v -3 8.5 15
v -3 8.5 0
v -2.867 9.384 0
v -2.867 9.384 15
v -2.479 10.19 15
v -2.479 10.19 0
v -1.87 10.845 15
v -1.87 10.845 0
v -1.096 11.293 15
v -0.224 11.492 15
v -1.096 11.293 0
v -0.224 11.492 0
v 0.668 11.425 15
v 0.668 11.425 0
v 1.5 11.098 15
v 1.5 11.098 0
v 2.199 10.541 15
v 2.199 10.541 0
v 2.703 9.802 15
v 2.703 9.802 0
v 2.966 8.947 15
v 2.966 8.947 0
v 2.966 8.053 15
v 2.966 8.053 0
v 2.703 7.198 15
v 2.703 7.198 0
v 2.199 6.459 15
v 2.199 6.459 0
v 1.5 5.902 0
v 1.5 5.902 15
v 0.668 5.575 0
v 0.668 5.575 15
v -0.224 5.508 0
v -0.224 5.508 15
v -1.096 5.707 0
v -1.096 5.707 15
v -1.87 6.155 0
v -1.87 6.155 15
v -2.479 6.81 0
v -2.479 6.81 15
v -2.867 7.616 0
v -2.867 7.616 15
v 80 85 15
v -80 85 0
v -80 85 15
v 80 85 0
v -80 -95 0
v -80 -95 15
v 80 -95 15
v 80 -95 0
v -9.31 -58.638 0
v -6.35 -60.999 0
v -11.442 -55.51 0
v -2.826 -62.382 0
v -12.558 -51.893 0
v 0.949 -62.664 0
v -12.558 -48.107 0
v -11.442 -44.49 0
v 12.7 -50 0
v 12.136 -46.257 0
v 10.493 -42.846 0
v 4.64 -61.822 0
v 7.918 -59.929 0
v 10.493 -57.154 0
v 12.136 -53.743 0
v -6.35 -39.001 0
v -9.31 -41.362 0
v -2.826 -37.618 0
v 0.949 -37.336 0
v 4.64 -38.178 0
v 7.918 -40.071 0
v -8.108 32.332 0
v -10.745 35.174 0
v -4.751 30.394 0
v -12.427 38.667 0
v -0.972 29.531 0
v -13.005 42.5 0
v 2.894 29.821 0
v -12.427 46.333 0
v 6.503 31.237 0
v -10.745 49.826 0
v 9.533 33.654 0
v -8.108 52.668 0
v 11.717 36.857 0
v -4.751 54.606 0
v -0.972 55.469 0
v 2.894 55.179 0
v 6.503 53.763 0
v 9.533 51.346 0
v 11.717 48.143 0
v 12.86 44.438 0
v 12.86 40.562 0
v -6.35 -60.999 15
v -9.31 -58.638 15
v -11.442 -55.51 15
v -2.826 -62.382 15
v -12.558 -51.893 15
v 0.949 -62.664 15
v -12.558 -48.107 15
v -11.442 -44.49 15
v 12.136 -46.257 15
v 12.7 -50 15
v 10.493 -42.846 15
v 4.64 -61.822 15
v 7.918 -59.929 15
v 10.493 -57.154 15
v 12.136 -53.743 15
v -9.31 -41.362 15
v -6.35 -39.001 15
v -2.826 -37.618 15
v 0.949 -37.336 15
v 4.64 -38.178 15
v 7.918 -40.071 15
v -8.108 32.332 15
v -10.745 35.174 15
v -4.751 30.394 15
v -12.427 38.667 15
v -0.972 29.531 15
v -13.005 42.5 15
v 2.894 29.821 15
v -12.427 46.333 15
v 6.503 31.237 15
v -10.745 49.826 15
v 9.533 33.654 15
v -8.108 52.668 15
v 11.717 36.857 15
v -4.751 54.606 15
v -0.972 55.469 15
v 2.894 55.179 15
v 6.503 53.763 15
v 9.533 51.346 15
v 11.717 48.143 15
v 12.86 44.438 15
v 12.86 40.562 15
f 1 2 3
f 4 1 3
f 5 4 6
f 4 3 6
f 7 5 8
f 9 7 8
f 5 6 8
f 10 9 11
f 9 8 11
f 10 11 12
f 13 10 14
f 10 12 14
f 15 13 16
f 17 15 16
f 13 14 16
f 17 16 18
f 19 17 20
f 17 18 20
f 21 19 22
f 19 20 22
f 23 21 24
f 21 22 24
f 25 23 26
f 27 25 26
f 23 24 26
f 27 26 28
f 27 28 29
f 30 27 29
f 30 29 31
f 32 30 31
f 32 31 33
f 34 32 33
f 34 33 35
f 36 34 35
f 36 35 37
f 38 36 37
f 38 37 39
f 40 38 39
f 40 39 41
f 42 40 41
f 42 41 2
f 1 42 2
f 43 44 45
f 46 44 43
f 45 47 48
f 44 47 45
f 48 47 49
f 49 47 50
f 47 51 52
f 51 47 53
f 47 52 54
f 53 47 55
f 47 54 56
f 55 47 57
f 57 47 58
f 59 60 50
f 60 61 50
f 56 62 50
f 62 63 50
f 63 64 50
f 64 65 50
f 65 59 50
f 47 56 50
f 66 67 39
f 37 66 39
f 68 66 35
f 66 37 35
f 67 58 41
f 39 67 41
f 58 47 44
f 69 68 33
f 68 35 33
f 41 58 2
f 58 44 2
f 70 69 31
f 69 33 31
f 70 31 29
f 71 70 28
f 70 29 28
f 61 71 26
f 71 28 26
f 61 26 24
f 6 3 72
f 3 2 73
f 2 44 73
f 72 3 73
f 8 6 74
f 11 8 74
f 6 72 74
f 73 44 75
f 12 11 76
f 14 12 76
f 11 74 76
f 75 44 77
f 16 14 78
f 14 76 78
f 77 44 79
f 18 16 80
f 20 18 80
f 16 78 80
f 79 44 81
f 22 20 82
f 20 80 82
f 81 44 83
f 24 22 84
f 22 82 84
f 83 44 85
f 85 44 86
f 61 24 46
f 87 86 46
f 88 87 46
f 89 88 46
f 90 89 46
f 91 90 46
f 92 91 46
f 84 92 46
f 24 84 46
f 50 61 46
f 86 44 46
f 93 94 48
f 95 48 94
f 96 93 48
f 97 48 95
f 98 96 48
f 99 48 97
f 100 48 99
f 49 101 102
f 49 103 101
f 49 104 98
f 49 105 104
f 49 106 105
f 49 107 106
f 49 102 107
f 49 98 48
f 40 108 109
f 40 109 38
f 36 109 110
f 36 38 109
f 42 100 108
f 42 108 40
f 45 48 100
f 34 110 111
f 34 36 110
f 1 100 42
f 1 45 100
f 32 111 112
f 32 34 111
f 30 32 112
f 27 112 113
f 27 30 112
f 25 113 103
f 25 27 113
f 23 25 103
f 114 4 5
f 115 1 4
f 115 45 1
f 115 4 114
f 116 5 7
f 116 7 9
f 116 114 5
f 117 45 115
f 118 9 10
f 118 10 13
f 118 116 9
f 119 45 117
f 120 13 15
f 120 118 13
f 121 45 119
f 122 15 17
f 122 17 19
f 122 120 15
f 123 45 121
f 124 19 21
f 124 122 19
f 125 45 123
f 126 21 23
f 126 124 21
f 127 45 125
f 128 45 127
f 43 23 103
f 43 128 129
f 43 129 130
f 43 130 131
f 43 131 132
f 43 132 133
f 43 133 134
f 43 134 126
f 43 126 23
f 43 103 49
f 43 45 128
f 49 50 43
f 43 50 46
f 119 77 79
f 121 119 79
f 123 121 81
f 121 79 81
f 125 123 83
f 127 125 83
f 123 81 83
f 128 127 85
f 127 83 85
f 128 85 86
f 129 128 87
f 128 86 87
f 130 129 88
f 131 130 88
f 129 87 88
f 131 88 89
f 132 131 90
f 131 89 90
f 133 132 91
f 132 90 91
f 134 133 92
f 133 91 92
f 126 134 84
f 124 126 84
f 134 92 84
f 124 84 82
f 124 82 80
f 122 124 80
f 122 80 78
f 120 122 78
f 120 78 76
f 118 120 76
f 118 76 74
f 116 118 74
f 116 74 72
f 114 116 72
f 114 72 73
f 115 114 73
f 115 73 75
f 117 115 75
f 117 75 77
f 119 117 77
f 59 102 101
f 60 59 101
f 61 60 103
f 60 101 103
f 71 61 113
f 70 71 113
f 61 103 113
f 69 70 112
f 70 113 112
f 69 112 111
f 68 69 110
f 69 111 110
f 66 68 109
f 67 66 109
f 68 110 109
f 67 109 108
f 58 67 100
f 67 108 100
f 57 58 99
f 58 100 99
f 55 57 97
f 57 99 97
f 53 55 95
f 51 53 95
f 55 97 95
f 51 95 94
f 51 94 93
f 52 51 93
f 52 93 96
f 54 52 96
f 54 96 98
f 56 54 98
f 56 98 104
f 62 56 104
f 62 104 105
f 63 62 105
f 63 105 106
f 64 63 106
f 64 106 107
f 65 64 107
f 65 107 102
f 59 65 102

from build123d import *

# Parameters (mm, degrees)
SKETCH2_W                  = 160
SKETCH2_H                  = 180
BOSS_EXTRUDE1_DEPTH        = 15
F_20_0_20_DIAMETER_HOLE1_D = 26.01
F_6_0MM_DOWEL_HOLE1_D      = 6
F_6_0MM_DOWEL_HOLE1_DEPTH  = 40
F_6_0MM_DOWEL_HOLE1_TIP    = 1.802581857
SKETCH10_R                 = 12.7
CUT_EXTRUDE1_DEPTH         = 16


with BuildPart() as part:
    # Sketch2 → Boss-Extrude1 (new body)
    with BuildSketch(Plane.XY):
        with Locations((0, -5)):
            Rectangle(SKETCH2_W, SKETCH2_H)
    extrude(amount=BOSS_EXTRUDE1_DEPTH)

    # Ø20.0 (20) Diameter Hole1 (through all)
    with Locations(Plane.XY.offset(15)):
        with Locations((0, 42.5)):
            Hole(F_20_0_20_DIAMETER_HOLE1_D / 2)

    # Ø6.0mm Dowel Hole1
    with Locations(Plane.XY.offset(15)):
        with Locations((0, 8.5)):
            Hole(F_6_0MM_DOWEL_HOLE1_D / 2, depth=F_6_0MM_DOWEL_HOLE1_DEPTH)
            with Locations((0, 0, -(F_6_0MM_DOWEL_HOLE1_DEPTH + F_6_0MM_DOWEL_HOLE1_TIP / 2))):  # 118° drill point
                Cone(0, F_6_0MM_DOWEL_HOLE1_D / 2, F_6_0MM_DOWEL_HOLE1_TIP, mode=Mode.SUBTRACT)

    # Sketch10 → Cut-Extrude1 (cut, through all)
    with BuildSketch(Plane.XY.offset(15)):
        with Locations((0, -50)):
            Circle(SKETCH10_R)
    extrude(amount=-CUT_EXTRUDE1_DEPTH, mode=Mode.SUBTRACT)


solid = part.part
